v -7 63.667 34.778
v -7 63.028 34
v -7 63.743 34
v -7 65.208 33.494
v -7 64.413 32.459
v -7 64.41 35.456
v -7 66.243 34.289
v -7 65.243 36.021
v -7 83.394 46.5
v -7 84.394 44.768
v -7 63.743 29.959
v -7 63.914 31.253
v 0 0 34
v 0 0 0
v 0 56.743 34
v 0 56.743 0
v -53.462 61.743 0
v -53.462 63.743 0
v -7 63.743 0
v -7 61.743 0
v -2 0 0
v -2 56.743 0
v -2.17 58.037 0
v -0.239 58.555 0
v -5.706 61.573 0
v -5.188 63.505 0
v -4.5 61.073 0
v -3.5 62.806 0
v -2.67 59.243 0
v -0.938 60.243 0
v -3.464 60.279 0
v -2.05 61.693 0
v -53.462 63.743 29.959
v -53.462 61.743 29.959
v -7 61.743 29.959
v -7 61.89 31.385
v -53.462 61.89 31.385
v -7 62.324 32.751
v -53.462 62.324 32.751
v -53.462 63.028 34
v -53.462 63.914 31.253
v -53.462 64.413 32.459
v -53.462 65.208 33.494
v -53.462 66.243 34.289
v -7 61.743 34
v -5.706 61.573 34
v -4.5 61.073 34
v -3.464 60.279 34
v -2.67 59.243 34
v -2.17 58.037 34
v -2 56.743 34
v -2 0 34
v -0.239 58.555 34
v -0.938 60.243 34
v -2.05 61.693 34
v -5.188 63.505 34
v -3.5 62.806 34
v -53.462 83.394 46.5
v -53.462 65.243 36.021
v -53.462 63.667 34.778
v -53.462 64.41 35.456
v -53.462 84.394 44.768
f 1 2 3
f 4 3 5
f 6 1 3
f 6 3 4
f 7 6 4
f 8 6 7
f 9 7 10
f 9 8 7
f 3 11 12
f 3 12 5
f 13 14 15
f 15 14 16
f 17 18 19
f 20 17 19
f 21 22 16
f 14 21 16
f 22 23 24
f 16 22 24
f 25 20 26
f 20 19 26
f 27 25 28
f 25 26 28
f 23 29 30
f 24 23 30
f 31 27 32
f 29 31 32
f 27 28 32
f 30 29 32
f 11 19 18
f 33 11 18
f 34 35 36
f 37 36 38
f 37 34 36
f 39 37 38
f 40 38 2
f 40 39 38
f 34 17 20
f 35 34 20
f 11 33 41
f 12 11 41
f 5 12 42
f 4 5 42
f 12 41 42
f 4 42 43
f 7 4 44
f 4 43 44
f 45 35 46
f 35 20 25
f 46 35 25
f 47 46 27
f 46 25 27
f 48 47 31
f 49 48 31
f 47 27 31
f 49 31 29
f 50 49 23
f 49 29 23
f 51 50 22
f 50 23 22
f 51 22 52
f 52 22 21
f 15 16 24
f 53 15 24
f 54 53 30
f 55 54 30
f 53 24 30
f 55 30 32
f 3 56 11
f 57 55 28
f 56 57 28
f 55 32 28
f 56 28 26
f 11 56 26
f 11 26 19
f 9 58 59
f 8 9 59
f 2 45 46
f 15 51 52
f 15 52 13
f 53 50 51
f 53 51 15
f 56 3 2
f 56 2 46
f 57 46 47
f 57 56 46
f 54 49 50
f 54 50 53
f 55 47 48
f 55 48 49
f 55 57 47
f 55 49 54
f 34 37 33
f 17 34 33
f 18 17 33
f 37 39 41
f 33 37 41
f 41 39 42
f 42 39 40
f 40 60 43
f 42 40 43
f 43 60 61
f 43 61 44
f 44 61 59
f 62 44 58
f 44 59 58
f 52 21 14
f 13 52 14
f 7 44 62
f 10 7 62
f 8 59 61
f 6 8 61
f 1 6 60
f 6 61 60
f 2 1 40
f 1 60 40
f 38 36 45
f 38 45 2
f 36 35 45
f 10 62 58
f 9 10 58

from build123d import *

# Parameters (mm, degrees)
BASE_FLANGE1_DEPTH   = 34
EDGE_FLANGE1_START   = -53.462169132
EDGE_FLANGE1_DEPTH   = 46.462169132
EDGE_FLANGE1_2_DEPTH = 46.462169132


# Read off the part's stored shape, not the designer's step: Edge-Flange1
# Sheet-metal steps are written as plain solids
with BuildPart() as part:
    # Sketch1 → Base-Flange1 (new body)
    with BuildSketch(Plane.XY):
        with BuildLine():
            Line((0, 0), (0, 56.743355504))
            ThreePointArc((0, 56.743355504), (-2.050252532, 61.693102972), (-7, 63.743355504))
            Line((-7, 63.743355504), (-53.462169132, 63.743355504))
            Line((-53.462169132, 63.743355504), (-53.462169132, 61.743355504))
            Line((-53.462169132, 61.743355504), (-7, 61.743355504))
            ThreePointArc((-7, 61.743355504), (-3.464466094, 60.278889409), (-2, 56.743355504))
            Line((-2, 56.743355504), (-2, 0))
            Line((-2, 0), (0, 0))
        make_face()
    extrude(amount=BASE_FLANGE1_DEPTH)

    # Edge-Flange1 outline → Edge-Flange1 (cut)
    with BuildSketch(Plane.YZ.offset(EDGE_FLANGE1_START)):
        with BuildLine():
            ThreePointArc((61.743355504, 29.958548116), (62.072211206, 32.078886242), (63.027879437, 34))
            Line((63.027879437, 34), (61.743355504, 34))
            Line((61.743355504, 34), (61.743355504, 29.958548116))
        make_face()
    extrude(amount=EDGE_FLANGE1_DEPTH, mode=Mode.SUBTRACT)

    # Edge-Flange1 2 outline → Edge-Flange1 2 (add)
    with BuildSketch(Plane.YZ.offset(EDGE_FLANGE1_START)):
        with BuildLine():
            Line((83.393990598, 46.5), (65.243355504, 36.020725942))
            ThreePointArc((65.243355504, 36.020725942), (64.026144133, 35.130386946), (63.027879437, 34))
            Line((63.027879437, 34), (63.743355504, 34))
            Line((63.743355504, 34), (63.743355504, 29.958548116))
            ThreePointArc((63.743355504, 29.958548116), (64.413228485, 32.458548116), (66.243355504, 34.288675135))
            Line((66.243355504, 34.288675135), (84.393990598, 44.767949192))
            Line((84.393990598, 44.767949192), (83.393990598, 46.5))
        make_face()
    extrude(amount=EDGE_FLANGE1_2_DEPTH)


solid = part.part
